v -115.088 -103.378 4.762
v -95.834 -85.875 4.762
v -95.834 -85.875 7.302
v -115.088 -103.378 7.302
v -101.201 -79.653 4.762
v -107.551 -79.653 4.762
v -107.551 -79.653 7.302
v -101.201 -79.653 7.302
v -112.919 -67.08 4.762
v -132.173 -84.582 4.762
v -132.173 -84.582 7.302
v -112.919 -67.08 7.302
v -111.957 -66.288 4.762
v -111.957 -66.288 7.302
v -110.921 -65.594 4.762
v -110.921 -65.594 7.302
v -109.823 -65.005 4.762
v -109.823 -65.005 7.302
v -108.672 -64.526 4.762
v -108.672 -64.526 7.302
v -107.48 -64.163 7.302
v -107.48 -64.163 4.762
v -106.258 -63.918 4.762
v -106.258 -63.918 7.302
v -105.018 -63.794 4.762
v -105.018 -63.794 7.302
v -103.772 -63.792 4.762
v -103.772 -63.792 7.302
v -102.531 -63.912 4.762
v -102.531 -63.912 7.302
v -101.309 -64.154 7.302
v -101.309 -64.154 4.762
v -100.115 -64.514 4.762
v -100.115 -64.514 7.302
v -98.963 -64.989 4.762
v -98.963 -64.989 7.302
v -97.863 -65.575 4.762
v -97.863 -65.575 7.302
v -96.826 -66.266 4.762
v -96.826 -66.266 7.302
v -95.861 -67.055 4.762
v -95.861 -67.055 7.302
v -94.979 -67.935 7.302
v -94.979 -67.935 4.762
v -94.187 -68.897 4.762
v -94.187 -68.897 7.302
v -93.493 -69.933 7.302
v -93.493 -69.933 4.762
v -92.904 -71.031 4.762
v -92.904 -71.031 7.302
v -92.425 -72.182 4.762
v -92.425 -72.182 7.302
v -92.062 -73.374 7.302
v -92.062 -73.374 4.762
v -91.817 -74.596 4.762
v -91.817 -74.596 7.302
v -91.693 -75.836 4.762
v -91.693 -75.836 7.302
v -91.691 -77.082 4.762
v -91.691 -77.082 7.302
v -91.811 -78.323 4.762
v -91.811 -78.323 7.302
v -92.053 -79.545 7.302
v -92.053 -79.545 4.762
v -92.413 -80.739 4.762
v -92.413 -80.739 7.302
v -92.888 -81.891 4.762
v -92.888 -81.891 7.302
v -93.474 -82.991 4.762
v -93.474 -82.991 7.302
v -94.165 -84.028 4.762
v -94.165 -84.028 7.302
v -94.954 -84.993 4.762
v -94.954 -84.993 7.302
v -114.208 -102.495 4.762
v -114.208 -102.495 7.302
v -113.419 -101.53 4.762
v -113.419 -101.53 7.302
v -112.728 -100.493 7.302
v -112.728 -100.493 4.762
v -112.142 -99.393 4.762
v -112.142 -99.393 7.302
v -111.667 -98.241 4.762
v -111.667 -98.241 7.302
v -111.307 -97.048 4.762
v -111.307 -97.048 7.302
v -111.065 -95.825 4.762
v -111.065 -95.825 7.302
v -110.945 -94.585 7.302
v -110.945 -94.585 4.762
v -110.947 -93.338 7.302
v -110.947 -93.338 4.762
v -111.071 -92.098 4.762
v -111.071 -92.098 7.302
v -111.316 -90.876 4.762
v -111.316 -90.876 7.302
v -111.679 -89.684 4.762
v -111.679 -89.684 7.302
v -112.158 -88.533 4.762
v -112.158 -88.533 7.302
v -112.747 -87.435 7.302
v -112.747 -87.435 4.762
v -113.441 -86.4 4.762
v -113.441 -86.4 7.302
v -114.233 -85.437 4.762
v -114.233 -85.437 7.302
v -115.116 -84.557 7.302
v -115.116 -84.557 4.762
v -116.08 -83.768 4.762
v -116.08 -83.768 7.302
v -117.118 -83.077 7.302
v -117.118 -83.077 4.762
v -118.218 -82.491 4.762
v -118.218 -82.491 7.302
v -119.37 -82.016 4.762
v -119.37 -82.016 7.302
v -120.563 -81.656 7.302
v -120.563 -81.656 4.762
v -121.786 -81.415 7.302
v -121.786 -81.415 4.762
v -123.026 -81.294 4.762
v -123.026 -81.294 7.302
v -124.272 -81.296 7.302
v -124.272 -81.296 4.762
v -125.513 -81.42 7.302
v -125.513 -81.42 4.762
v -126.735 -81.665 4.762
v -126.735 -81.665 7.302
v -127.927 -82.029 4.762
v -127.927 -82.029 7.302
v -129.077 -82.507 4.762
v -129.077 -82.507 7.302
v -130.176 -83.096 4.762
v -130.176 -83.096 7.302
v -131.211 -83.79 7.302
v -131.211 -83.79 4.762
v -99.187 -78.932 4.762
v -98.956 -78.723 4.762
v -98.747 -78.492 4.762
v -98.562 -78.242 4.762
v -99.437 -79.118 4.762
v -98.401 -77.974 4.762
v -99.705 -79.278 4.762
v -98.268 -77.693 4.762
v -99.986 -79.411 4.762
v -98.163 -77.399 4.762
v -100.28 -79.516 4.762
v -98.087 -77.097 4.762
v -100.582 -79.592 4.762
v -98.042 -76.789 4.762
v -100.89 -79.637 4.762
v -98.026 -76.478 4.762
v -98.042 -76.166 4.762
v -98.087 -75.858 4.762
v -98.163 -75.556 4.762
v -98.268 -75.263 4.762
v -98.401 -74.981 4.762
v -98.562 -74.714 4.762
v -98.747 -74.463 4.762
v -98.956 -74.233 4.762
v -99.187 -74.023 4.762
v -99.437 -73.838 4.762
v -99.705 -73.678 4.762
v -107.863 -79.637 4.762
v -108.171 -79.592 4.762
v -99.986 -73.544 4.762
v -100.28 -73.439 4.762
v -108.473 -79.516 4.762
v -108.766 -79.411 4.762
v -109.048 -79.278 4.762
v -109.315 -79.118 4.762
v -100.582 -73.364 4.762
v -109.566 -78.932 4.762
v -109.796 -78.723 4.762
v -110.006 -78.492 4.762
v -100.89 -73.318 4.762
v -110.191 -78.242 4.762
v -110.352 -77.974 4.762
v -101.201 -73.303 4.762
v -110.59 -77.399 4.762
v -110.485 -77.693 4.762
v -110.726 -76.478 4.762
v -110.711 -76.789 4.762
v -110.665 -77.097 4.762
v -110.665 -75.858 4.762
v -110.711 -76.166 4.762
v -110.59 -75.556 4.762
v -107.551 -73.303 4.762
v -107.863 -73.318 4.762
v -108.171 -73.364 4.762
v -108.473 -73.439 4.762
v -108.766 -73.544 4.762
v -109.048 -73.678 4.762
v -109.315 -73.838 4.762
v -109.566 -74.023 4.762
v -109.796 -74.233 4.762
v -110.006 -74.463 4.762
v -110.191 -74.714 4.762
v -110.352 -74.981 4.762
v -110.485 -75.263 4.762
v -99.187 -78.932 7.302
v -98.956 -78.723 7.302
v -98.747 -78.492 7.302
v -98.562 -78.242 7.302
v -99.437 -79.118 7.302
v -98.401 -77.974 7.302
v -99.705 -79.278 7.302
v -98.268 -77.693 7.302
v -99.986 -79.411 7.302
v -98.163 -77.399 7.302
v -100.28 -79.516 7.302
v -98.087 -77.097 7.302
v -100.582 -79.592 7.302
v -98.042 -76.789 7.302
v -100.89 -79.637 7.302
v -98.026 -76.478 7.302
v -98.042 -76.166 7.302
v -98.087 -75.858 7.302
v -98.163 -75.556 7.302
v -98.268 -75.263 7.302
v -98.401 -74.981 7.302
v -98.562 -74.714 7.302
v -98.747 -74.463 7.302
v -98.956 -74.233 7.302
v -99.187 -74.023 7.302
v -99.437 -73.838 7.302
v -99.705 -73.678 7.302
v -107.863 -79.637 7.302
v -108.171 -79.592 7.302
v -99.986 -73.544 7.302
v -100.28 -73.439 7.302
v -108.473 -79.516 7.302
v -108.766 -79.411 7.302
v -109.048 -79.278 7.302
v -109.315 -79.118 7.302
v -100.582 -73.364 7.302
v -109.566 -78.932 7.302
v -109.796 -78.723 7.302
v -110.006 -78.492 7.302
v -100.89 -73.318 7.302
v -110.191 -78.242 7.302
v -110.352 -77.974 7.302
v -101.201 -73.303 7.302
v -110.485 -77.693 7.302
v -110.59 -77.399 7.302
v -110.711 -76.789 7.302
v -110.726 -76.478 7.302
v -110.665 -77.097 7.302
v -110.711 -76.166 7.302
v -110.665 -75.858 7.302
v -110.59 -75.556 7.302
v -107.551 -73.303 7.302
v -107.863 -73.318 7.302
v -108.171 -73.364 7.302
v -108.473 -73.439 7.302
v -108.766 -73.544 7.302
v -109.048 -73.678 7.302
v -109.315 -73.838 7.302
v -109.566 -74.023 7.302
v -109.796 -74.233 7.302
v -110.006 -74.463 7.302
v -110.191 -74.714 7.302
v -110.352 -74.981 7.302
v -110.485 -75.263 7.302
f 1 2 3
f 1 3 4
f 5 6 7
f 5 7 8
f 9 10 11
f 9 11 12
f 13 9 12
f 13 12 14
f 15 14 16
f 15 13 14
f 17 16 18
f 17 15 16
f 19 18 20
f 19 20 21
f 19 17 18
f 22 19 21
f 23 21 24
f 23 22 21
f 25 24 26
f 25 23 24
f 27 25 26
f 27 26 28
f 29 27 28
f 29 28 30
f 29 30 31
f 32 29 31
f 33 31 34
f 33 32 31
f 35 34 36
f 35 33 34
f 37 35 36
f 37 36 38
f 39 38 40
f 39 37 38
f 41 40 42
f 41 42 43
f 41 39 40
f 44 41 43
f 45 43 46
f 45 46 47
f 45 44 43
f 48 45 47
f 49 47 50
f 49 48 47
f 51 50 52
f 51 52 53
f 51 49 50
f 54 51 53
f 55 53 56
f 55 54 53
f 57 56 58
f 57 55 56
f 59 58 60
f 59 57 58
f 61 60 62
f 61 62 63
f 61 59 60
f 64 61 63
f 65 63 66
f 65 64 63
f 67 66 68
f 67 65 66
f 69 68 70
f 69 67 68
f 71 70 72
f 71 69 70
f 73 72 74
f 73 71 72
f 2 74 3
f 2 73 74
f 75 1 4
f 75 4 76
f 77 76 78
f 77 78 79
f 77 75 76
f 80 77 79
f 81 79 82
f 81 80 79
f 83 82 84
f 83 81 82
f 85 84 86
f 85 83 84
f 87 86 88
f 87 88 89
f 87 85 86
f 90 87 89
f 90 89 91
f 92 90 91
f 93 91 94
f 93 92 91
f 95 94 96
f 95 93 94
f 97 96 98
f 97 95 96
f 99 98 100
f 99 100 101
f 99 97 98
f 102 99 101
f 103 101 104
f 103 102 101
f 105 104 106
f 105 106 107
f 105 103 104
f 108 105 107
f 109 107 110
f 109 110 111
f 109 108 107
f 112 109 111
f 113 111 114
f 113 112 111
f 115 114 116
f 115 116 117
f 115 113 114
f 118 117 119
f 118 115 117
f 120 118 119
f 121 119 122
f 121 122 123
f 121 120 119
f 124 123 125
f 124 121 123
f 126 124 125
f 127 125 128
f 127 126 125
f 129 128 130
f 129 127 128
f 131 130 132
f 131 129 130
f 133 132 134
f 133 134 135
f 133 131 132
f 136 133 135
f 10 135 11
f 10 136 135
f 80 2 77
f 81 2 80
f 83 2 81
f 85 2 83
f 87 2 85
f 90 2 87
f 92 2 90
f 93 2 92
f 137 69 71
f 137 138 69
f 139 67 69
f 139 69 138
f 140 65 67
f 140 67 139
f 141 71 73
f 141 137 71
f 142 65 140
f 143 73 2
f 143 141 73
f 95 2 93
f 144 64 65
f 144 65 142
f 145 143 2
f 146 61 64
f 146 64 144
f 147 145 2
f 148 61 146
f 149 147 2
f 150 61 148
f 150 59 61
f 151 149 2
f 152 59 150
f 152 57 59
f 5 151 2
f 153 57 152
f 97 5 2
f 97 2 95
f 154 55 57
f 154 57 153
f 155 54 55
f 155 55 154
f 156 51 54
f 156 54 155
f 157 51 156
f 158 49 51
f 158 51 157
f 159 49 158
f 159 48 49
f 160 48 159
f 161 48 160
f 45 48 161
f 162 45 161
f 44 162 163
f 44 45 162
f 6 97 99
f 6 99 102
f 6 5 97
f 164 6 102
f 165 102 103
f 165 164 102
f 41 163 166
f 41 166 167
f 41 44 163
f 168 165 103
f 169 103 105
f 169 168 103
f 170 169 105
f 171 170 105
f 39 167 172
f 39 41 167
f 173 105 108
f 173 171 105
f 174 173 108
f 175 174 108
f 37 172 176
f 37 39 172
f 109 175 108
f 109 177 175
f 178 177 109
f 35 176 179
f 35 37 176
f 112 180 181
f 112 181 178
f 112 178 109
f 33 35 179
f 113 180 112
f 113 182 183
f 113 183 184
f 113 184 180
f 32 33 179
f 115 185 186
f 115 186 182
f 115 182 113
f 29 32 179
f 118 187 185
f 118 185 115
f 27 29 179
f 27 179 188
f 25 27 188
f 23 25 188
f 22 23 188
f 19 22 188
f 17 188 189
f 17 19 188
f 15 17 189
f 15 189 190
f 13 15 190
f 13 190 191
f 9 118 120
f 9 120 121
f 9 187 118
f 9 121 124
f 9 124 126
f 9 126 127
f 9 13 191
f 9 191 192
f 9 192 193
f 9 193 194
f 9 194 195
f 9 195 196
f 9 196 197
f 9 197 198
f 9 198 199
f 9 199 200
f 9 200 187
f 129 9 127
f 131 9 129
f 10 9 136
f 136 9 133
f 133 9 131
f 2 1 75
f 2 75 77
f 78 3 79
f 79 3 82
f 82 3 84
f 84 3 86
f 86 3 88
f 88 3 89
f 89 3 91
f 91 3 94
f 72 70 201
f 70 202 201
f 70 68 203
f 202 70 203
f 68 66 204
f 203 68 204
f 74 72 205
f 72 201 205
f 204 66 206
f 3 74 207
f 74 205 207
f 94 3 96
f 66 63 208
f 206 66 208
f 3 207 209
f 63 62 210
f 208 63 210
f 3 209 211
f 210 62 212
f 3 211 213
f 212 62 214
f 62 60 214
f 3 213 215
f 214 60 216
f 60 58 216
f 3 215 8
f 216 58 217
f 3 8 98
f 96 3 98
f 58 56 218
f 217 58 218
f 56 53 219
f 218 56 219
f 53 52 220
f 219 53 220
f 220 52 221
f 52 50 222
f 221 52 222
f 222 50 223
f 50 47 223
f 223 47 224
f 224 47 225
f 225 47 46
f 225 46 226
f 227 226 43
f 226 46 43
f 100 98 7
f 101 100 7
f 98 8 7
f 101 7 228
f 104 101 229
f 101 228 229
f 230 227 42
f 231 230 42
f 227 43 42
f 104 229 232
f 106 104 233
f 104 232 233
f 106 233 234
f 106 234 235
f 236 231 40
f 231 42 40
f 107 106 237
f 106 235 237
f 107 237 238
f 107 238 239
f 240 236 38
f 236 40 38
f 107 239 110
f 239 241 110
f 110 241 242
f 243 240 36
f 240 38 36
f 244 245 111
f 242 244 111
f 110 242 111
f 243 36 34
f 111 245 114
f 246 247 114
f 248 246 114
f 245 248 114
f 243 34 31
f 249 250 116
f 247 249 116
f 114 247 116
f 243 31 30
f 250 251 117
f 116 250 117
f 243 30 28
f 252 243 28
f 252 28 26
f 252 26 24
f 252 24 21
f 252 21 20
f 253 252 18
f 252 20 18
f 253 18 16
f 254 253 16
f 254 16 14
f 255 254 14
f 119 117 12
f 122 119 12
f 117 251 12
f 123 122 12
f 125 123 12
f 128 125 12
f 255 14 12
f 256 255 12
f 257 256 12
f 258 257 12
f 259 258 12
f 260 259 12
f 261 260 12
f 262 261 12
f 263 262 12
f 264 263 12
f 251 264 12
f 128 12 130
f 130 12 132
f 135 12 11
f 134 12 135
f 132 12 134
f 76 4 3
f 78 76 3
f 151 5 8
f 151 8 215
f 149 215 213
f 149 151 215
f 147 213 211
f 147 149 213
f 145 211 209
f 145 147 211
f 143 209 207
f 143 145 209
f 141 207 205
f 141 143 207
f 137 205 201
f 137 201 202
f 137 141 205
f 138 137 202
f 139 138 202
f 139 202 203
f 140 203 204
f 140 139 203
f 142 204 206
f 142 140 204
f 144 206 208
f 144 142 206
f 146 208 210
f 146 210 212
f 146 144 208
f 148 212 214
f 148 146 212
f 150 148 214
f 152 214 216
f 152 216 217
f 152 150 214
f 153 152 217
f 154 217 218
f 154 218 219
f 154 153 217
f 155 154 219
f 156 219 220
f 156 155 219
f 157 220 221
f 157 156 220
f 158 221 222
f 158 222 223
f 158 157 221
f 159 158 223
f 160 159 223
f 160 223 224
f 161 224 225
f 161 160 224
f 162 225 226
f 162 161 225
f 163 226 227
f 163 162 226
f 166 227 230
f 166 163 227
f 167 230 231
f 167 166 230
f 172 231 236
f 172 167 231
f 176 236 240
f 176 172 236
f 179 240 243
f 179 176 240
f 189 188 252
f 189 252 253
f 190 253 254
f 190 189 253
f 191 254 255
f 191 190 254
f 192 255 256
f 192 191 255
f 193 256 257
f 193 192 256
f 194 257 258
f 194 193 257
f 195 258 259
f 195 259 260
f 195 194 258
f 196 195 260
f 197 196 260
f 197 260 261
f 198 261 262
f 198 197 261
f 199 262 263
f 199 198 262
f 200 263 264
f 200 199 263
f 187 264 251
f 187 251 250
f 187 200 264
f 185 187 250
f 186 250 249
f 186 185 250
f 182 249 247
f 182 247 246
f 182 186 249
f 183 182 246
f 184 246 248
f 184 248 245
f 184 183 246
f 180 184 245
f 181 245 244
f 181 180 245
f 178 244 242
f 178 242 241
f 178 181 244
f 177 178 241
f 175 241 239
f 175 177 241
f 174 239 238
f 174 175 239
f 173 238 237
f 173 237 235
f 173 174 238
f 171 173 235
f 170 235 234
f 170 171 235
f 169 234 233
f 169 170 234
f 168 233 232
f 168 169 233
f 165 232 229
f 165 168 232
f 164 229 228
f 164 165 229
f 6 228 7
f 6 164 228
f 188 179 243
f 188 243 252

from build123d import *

# Parameters (mm, degrees)
BOSS_EXTRUDE3_START = 4.7625
BOSS_EXTRUDE3_DEPTH = 2.54


with BuildPart() as part:
    # Sketch2 → Boss-Extrude3 (new body)
    with BuildSketch(Plane.XY.offset(BOSS_EXTRUDE3_START)):
        with BuildLine():
            Line((-132.173225325, -84.582396488), (-112.918972687, -67.080031215))
            ThreePointArc((-112.918972687, -67.080031215), (-94.978825746, -67.935091298), (-95.833885829, -85.875238239))
            Line((-95.833885829, -85.875238239), (-115.088138468, -103.377603512))
            ThreePointArc((-115.088138468, -103.377603512), (-114.233078385, -85.437456571), (-132.173225325, -84.582396488))
        make_face()
        with BuildLine():
            Line((-107.551429258, -79.652634727), (-101.201429258, -79.652634727))
            ThreePointArc((-101.201429258, -79.652634727), (-98.026429258, -76.477634727), (-101.201429258, -73.302634727))
            Line((-101.201429258, -73.302634727), (-107.551429258, -73.302634727))
            ThreePointArc((-107.551429258, -73.302634727), (-110.726429258, -76.477634727), (-107.551429258, -79.652634727))
        make_face(mode=Mode.SUBTRACT)
    extrude(amount=BOSS_EXTRUDE3_DEPTH)


solid = part.part
